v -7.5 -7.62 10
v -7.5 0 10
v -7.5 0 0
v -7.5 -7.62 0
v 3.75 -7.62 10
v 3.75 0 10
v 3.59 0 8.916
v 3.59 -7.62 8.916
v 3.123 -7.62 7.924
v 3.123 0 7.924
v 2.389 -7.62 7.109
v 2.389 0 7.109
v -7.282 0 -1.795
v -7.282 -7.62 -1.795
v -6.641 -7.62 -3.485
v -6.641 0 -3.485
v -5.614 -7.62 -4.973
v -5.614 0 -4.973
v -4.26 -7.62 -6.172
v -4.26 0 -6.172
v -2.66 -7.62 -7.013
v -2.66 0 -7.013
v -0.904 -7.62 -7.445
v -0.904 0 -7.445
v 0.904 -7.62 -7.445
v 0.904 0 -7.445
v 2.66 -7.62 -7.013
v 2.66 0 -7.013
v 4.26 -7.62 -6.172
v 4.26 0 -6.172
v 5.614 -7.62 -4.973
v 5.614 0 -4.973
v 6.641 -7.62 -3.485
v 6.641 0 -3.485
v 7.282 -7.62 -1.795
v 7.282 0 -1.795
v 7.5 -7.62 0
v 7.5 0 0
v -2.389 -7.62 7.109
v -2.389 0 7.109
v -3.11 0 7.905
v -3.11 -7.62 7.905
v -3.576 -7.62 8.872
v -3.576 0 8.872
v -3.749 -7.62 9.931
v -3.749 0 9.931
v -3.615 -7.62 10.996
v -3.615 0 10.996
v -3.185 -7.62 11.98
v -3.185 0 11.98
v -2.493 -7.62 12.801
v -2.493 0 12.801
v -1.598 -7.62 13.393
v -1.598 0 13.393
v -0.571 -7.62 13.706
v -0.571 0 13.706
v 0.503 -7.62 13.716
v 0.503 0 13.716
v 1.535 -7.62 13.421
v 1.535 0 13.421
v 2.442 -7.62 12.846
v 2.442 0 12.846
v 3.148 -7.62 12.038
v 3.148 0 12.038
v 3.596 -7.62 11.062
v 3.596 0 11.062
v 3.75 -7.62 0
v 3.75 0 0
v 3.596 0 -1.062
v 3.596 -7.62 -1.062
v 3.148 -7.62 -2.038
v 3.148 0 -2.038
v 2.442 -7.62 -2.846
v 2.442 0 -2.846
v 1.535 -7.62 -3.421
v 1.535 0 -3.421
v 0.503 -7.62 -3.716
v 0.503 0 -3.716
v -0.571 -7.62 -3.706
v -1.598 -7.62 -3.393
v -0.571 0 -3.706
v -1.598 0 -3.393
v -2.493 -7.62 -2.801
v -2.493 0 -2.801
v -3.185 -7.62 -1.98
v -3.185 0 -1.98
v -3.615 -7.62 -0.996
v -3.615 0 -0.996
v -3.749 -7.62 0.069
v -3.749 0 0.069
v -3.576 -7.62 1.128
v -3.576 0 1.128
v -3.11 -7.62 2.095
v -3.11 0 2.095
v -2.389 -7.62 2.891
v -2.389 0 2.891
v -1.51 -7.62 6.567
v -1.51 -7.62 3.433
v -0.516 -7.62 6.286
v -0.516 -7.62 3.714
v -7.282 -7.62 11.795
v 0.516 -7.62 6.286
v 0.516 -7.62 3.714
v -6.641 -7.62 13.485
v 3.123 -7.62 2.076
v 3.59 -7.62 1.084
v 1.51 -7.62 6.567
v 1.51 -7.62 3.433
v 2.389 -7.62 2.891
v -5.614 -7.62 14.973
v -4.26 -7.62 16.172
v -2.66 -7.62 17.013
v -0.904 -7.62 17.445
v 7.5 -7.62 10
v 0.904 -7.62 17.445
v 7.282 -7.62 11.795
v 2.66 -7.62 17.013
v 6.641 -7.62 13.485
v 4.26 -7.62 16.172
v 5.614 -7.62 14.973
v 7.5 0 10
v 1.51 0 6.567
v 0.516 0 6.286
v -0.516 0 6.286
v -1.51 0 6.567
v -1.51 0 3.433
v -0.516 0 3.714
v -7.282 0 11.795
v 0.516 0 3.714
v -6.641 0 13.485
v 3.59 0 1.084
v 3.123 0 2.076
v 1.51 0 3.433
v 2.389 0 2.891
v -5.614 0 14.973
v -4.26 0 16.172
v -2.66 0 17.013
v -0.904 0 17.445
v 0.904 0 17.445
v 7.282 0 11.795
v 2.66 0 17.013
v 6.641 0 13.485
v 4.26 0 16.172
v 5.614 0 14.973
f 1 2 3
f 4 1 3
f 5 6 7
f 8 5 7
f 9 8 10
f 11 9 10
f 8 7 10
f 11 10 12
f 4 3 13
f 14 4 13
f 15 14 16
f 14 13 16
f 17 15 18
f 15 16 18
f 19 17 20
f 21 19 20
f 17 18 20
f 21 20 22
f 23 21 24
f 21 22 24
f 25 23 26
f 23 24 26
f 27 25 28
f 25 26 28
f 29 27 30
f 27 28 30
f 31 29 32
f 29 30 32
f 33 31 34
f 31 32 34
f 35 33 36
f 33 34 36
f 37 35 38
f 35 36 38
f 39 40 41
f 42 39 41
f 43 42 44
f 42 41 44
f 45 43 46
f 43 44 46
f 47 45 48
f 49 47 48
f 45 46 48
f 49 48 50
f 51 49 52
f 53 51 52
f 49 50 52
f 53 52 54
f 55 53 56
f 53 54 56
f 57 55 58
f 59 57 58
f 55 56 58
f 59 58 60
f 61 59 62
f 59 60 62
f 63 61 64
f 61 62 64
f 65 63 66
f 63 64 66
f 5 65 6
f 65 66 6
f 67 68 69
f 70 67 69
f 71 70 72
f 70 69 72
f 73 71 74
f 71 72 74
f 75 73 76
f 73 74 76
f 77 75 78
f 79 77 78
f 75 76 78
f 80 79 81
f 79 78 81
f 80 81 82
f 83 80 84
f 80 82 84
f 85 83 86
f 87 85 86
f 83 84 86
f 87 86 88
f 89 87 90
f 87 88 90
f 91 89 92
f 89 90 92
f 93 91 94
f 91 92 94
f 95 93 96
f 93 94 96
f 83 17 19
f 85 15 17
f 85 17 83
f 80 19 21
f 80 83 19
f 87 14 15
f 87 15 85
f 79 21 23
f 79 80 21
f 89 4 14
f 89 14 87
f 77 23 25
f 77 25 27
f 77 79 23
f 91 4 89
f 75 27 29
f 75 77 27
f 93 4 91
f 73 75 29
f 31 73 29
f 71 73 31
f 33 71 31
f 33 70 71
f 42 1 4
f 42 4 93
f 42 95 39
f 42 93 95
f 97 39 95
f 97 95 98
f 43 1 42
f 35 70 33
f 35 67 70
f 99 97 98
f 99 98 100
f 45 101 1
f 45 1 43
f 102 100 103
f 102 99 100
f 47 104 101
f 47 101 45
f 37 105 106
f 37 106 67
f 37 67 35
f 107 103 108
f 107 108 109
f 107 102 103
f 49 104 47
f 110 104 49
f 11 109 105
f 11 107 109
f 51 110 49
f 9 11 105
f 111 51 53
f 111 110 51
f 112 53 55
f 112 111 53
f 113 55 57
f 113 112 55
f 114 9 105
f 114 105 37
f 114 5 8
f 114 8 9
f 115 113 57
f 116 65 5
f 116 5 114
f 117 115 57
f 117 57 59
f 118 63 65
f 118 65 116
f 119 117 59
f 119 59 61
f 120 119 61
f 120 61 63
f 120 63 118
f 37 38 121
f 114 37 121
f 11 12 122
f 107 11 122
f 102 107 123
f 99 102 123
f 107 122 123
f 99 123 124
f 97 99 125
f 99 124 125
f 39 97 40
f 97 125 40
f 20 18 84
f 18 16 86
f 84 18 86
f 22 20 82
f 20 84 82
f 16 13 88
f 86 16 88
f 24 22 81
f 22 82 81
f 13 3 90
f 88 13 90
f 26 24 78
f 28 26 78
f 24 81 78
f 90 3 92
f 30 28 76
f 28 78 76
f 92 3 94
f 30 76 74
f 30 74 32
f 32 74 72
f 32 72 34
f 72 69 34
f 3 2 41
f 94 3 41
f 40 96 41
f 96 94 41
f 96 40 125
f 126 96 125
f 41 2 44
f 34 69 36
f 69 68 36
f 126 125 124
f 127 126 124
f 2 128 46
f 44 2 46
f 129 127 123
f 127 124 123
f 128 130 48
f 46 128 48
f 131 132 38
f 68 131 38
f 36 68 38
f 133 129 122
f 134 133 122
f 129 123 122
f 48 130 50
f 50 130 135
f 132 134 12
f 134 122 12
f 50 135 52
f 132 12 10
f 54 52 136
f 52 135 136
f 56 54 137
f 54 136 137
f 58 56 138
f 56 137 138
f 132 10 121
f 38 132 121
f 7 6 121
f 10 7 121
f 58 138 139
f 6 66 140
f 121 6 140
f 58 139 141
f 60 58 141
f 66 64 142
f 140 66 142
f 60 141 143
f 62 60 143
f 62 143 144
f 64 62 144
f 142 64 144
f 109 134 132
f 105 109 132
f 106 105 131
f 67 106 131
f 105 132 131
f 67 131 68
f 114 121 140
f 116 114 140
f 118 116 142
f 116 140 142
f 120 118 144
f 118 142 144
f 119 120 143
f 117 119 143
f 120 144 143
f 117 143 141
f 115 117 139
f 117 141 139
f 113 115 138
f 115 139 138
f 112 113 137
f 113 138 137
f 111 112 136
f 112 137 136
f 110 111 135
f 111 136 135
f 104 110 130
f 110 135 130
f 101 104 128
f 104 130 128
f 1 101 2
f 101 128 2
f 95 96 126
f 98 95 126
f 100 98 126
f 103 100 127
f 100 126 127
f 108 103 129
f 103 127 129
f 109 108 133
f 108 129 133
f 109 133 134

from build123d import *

# Parameters (mm, degrees)
F1_DEPTH = 7.62


with BuildPart() as f1:
    # F0 (on Front) → F1 (new body)
    with BuildSketch(Plane.XZ):
        with BuildLine():
            ThreePointArc((2.388888, 7.109375), (4.126586, 6.26269), (5.59017, 5))
            ThreePointArc((5.59017, 5), (7.006293, 7.323834), (7.5, 10))
            ThreePointArc((7.5, 10), (0, 17.5), (-7.5, 10))
            ThreePointArc((-7.5, 10), (-7.006293, 7.323834), (-5.59017, 5))
            ThreePointArc((-5.59017, 5), (-4.126586, 6.26269), (-2.388888, 7.109375))
            ThreePointArc((-2.388888, 7.109375), (-1.597524, 13.3927), (3.75, 10))
            ThreePointArc((3.75, 10), (3.3927, 8.402476), (2.388888, 7.109375))
        make_face()
        with BuildLine():
            ThreePointArc((-2.388888, 2.890625), (0, 3.75), (2.388888, 2.890625))
            ThreePointArc((2.388888, 2.890625), (4.126586, 3.73731), (5.59017, 5))
            ThreePointArc((5.59017, 5), (4.126586, 6.26269), (2.388888, 7.109375))
            ThreePointArc((2.388888, 7.109375), (0, 6.25), (-2.388888, 7.109375))
            ThreePointArc((-2.388888, 7.109375), (-4.126586, 6.26269), (-5.59017, 5))
            ThreePointArc((-5.59017, 5), (-4.126586, 3.73731), (-2.388888, 2.890625))
        make_face()
        with BuildLine():
            ThreePointArc((2.388888, 2.890625), (3.3927, 1.597524), (3.75, 0))
            ThreePointArc((3.75, 0), (-1.597524, -3.3927), (-2.388888, 2.890625))
            ThreePointArc((-2.388888, 2.890625), (-4.126586, 3.73731), (-5.59017, 5))
            ThreePointArc((-5.59017, 5), (-7.006293, 2.676166), (-7.5, 0))
            ThreePointArc((-7.5, 0), (0, -7.5), (7.5, 0))
            ThreePointArc((7.5, 0), (7.006293, 2.676166), (5.59017, 5))
            ThreePointArc((5.59017, 5), (4.126586, 3.73731), (2.388888, 2.890625))
        make_face()
        with BuildLine():
            ThreePointArc((7.5, 10), (7.006293, 7.323834), (5.59017, 5))
            ThreePointArc((5.59017, 5), (7.006293, 2.676166), (7.5, 0))
            Line((7.5, 0), (7.5, 10))
        make_face()
        with BuildLine():
            ThreePointArc((-7.5, 0), (-7.006293, 2.676166), (-5.59017, 5))
            ThreePointArc((-5.59017, 5), (-7.006293, 7.323834), (-7.5, 10))
            Line((-7.5, 10), (-7.5, 0))
        make_face()
    extrude(amount=F1_DEPTH)


solid = f1.part
